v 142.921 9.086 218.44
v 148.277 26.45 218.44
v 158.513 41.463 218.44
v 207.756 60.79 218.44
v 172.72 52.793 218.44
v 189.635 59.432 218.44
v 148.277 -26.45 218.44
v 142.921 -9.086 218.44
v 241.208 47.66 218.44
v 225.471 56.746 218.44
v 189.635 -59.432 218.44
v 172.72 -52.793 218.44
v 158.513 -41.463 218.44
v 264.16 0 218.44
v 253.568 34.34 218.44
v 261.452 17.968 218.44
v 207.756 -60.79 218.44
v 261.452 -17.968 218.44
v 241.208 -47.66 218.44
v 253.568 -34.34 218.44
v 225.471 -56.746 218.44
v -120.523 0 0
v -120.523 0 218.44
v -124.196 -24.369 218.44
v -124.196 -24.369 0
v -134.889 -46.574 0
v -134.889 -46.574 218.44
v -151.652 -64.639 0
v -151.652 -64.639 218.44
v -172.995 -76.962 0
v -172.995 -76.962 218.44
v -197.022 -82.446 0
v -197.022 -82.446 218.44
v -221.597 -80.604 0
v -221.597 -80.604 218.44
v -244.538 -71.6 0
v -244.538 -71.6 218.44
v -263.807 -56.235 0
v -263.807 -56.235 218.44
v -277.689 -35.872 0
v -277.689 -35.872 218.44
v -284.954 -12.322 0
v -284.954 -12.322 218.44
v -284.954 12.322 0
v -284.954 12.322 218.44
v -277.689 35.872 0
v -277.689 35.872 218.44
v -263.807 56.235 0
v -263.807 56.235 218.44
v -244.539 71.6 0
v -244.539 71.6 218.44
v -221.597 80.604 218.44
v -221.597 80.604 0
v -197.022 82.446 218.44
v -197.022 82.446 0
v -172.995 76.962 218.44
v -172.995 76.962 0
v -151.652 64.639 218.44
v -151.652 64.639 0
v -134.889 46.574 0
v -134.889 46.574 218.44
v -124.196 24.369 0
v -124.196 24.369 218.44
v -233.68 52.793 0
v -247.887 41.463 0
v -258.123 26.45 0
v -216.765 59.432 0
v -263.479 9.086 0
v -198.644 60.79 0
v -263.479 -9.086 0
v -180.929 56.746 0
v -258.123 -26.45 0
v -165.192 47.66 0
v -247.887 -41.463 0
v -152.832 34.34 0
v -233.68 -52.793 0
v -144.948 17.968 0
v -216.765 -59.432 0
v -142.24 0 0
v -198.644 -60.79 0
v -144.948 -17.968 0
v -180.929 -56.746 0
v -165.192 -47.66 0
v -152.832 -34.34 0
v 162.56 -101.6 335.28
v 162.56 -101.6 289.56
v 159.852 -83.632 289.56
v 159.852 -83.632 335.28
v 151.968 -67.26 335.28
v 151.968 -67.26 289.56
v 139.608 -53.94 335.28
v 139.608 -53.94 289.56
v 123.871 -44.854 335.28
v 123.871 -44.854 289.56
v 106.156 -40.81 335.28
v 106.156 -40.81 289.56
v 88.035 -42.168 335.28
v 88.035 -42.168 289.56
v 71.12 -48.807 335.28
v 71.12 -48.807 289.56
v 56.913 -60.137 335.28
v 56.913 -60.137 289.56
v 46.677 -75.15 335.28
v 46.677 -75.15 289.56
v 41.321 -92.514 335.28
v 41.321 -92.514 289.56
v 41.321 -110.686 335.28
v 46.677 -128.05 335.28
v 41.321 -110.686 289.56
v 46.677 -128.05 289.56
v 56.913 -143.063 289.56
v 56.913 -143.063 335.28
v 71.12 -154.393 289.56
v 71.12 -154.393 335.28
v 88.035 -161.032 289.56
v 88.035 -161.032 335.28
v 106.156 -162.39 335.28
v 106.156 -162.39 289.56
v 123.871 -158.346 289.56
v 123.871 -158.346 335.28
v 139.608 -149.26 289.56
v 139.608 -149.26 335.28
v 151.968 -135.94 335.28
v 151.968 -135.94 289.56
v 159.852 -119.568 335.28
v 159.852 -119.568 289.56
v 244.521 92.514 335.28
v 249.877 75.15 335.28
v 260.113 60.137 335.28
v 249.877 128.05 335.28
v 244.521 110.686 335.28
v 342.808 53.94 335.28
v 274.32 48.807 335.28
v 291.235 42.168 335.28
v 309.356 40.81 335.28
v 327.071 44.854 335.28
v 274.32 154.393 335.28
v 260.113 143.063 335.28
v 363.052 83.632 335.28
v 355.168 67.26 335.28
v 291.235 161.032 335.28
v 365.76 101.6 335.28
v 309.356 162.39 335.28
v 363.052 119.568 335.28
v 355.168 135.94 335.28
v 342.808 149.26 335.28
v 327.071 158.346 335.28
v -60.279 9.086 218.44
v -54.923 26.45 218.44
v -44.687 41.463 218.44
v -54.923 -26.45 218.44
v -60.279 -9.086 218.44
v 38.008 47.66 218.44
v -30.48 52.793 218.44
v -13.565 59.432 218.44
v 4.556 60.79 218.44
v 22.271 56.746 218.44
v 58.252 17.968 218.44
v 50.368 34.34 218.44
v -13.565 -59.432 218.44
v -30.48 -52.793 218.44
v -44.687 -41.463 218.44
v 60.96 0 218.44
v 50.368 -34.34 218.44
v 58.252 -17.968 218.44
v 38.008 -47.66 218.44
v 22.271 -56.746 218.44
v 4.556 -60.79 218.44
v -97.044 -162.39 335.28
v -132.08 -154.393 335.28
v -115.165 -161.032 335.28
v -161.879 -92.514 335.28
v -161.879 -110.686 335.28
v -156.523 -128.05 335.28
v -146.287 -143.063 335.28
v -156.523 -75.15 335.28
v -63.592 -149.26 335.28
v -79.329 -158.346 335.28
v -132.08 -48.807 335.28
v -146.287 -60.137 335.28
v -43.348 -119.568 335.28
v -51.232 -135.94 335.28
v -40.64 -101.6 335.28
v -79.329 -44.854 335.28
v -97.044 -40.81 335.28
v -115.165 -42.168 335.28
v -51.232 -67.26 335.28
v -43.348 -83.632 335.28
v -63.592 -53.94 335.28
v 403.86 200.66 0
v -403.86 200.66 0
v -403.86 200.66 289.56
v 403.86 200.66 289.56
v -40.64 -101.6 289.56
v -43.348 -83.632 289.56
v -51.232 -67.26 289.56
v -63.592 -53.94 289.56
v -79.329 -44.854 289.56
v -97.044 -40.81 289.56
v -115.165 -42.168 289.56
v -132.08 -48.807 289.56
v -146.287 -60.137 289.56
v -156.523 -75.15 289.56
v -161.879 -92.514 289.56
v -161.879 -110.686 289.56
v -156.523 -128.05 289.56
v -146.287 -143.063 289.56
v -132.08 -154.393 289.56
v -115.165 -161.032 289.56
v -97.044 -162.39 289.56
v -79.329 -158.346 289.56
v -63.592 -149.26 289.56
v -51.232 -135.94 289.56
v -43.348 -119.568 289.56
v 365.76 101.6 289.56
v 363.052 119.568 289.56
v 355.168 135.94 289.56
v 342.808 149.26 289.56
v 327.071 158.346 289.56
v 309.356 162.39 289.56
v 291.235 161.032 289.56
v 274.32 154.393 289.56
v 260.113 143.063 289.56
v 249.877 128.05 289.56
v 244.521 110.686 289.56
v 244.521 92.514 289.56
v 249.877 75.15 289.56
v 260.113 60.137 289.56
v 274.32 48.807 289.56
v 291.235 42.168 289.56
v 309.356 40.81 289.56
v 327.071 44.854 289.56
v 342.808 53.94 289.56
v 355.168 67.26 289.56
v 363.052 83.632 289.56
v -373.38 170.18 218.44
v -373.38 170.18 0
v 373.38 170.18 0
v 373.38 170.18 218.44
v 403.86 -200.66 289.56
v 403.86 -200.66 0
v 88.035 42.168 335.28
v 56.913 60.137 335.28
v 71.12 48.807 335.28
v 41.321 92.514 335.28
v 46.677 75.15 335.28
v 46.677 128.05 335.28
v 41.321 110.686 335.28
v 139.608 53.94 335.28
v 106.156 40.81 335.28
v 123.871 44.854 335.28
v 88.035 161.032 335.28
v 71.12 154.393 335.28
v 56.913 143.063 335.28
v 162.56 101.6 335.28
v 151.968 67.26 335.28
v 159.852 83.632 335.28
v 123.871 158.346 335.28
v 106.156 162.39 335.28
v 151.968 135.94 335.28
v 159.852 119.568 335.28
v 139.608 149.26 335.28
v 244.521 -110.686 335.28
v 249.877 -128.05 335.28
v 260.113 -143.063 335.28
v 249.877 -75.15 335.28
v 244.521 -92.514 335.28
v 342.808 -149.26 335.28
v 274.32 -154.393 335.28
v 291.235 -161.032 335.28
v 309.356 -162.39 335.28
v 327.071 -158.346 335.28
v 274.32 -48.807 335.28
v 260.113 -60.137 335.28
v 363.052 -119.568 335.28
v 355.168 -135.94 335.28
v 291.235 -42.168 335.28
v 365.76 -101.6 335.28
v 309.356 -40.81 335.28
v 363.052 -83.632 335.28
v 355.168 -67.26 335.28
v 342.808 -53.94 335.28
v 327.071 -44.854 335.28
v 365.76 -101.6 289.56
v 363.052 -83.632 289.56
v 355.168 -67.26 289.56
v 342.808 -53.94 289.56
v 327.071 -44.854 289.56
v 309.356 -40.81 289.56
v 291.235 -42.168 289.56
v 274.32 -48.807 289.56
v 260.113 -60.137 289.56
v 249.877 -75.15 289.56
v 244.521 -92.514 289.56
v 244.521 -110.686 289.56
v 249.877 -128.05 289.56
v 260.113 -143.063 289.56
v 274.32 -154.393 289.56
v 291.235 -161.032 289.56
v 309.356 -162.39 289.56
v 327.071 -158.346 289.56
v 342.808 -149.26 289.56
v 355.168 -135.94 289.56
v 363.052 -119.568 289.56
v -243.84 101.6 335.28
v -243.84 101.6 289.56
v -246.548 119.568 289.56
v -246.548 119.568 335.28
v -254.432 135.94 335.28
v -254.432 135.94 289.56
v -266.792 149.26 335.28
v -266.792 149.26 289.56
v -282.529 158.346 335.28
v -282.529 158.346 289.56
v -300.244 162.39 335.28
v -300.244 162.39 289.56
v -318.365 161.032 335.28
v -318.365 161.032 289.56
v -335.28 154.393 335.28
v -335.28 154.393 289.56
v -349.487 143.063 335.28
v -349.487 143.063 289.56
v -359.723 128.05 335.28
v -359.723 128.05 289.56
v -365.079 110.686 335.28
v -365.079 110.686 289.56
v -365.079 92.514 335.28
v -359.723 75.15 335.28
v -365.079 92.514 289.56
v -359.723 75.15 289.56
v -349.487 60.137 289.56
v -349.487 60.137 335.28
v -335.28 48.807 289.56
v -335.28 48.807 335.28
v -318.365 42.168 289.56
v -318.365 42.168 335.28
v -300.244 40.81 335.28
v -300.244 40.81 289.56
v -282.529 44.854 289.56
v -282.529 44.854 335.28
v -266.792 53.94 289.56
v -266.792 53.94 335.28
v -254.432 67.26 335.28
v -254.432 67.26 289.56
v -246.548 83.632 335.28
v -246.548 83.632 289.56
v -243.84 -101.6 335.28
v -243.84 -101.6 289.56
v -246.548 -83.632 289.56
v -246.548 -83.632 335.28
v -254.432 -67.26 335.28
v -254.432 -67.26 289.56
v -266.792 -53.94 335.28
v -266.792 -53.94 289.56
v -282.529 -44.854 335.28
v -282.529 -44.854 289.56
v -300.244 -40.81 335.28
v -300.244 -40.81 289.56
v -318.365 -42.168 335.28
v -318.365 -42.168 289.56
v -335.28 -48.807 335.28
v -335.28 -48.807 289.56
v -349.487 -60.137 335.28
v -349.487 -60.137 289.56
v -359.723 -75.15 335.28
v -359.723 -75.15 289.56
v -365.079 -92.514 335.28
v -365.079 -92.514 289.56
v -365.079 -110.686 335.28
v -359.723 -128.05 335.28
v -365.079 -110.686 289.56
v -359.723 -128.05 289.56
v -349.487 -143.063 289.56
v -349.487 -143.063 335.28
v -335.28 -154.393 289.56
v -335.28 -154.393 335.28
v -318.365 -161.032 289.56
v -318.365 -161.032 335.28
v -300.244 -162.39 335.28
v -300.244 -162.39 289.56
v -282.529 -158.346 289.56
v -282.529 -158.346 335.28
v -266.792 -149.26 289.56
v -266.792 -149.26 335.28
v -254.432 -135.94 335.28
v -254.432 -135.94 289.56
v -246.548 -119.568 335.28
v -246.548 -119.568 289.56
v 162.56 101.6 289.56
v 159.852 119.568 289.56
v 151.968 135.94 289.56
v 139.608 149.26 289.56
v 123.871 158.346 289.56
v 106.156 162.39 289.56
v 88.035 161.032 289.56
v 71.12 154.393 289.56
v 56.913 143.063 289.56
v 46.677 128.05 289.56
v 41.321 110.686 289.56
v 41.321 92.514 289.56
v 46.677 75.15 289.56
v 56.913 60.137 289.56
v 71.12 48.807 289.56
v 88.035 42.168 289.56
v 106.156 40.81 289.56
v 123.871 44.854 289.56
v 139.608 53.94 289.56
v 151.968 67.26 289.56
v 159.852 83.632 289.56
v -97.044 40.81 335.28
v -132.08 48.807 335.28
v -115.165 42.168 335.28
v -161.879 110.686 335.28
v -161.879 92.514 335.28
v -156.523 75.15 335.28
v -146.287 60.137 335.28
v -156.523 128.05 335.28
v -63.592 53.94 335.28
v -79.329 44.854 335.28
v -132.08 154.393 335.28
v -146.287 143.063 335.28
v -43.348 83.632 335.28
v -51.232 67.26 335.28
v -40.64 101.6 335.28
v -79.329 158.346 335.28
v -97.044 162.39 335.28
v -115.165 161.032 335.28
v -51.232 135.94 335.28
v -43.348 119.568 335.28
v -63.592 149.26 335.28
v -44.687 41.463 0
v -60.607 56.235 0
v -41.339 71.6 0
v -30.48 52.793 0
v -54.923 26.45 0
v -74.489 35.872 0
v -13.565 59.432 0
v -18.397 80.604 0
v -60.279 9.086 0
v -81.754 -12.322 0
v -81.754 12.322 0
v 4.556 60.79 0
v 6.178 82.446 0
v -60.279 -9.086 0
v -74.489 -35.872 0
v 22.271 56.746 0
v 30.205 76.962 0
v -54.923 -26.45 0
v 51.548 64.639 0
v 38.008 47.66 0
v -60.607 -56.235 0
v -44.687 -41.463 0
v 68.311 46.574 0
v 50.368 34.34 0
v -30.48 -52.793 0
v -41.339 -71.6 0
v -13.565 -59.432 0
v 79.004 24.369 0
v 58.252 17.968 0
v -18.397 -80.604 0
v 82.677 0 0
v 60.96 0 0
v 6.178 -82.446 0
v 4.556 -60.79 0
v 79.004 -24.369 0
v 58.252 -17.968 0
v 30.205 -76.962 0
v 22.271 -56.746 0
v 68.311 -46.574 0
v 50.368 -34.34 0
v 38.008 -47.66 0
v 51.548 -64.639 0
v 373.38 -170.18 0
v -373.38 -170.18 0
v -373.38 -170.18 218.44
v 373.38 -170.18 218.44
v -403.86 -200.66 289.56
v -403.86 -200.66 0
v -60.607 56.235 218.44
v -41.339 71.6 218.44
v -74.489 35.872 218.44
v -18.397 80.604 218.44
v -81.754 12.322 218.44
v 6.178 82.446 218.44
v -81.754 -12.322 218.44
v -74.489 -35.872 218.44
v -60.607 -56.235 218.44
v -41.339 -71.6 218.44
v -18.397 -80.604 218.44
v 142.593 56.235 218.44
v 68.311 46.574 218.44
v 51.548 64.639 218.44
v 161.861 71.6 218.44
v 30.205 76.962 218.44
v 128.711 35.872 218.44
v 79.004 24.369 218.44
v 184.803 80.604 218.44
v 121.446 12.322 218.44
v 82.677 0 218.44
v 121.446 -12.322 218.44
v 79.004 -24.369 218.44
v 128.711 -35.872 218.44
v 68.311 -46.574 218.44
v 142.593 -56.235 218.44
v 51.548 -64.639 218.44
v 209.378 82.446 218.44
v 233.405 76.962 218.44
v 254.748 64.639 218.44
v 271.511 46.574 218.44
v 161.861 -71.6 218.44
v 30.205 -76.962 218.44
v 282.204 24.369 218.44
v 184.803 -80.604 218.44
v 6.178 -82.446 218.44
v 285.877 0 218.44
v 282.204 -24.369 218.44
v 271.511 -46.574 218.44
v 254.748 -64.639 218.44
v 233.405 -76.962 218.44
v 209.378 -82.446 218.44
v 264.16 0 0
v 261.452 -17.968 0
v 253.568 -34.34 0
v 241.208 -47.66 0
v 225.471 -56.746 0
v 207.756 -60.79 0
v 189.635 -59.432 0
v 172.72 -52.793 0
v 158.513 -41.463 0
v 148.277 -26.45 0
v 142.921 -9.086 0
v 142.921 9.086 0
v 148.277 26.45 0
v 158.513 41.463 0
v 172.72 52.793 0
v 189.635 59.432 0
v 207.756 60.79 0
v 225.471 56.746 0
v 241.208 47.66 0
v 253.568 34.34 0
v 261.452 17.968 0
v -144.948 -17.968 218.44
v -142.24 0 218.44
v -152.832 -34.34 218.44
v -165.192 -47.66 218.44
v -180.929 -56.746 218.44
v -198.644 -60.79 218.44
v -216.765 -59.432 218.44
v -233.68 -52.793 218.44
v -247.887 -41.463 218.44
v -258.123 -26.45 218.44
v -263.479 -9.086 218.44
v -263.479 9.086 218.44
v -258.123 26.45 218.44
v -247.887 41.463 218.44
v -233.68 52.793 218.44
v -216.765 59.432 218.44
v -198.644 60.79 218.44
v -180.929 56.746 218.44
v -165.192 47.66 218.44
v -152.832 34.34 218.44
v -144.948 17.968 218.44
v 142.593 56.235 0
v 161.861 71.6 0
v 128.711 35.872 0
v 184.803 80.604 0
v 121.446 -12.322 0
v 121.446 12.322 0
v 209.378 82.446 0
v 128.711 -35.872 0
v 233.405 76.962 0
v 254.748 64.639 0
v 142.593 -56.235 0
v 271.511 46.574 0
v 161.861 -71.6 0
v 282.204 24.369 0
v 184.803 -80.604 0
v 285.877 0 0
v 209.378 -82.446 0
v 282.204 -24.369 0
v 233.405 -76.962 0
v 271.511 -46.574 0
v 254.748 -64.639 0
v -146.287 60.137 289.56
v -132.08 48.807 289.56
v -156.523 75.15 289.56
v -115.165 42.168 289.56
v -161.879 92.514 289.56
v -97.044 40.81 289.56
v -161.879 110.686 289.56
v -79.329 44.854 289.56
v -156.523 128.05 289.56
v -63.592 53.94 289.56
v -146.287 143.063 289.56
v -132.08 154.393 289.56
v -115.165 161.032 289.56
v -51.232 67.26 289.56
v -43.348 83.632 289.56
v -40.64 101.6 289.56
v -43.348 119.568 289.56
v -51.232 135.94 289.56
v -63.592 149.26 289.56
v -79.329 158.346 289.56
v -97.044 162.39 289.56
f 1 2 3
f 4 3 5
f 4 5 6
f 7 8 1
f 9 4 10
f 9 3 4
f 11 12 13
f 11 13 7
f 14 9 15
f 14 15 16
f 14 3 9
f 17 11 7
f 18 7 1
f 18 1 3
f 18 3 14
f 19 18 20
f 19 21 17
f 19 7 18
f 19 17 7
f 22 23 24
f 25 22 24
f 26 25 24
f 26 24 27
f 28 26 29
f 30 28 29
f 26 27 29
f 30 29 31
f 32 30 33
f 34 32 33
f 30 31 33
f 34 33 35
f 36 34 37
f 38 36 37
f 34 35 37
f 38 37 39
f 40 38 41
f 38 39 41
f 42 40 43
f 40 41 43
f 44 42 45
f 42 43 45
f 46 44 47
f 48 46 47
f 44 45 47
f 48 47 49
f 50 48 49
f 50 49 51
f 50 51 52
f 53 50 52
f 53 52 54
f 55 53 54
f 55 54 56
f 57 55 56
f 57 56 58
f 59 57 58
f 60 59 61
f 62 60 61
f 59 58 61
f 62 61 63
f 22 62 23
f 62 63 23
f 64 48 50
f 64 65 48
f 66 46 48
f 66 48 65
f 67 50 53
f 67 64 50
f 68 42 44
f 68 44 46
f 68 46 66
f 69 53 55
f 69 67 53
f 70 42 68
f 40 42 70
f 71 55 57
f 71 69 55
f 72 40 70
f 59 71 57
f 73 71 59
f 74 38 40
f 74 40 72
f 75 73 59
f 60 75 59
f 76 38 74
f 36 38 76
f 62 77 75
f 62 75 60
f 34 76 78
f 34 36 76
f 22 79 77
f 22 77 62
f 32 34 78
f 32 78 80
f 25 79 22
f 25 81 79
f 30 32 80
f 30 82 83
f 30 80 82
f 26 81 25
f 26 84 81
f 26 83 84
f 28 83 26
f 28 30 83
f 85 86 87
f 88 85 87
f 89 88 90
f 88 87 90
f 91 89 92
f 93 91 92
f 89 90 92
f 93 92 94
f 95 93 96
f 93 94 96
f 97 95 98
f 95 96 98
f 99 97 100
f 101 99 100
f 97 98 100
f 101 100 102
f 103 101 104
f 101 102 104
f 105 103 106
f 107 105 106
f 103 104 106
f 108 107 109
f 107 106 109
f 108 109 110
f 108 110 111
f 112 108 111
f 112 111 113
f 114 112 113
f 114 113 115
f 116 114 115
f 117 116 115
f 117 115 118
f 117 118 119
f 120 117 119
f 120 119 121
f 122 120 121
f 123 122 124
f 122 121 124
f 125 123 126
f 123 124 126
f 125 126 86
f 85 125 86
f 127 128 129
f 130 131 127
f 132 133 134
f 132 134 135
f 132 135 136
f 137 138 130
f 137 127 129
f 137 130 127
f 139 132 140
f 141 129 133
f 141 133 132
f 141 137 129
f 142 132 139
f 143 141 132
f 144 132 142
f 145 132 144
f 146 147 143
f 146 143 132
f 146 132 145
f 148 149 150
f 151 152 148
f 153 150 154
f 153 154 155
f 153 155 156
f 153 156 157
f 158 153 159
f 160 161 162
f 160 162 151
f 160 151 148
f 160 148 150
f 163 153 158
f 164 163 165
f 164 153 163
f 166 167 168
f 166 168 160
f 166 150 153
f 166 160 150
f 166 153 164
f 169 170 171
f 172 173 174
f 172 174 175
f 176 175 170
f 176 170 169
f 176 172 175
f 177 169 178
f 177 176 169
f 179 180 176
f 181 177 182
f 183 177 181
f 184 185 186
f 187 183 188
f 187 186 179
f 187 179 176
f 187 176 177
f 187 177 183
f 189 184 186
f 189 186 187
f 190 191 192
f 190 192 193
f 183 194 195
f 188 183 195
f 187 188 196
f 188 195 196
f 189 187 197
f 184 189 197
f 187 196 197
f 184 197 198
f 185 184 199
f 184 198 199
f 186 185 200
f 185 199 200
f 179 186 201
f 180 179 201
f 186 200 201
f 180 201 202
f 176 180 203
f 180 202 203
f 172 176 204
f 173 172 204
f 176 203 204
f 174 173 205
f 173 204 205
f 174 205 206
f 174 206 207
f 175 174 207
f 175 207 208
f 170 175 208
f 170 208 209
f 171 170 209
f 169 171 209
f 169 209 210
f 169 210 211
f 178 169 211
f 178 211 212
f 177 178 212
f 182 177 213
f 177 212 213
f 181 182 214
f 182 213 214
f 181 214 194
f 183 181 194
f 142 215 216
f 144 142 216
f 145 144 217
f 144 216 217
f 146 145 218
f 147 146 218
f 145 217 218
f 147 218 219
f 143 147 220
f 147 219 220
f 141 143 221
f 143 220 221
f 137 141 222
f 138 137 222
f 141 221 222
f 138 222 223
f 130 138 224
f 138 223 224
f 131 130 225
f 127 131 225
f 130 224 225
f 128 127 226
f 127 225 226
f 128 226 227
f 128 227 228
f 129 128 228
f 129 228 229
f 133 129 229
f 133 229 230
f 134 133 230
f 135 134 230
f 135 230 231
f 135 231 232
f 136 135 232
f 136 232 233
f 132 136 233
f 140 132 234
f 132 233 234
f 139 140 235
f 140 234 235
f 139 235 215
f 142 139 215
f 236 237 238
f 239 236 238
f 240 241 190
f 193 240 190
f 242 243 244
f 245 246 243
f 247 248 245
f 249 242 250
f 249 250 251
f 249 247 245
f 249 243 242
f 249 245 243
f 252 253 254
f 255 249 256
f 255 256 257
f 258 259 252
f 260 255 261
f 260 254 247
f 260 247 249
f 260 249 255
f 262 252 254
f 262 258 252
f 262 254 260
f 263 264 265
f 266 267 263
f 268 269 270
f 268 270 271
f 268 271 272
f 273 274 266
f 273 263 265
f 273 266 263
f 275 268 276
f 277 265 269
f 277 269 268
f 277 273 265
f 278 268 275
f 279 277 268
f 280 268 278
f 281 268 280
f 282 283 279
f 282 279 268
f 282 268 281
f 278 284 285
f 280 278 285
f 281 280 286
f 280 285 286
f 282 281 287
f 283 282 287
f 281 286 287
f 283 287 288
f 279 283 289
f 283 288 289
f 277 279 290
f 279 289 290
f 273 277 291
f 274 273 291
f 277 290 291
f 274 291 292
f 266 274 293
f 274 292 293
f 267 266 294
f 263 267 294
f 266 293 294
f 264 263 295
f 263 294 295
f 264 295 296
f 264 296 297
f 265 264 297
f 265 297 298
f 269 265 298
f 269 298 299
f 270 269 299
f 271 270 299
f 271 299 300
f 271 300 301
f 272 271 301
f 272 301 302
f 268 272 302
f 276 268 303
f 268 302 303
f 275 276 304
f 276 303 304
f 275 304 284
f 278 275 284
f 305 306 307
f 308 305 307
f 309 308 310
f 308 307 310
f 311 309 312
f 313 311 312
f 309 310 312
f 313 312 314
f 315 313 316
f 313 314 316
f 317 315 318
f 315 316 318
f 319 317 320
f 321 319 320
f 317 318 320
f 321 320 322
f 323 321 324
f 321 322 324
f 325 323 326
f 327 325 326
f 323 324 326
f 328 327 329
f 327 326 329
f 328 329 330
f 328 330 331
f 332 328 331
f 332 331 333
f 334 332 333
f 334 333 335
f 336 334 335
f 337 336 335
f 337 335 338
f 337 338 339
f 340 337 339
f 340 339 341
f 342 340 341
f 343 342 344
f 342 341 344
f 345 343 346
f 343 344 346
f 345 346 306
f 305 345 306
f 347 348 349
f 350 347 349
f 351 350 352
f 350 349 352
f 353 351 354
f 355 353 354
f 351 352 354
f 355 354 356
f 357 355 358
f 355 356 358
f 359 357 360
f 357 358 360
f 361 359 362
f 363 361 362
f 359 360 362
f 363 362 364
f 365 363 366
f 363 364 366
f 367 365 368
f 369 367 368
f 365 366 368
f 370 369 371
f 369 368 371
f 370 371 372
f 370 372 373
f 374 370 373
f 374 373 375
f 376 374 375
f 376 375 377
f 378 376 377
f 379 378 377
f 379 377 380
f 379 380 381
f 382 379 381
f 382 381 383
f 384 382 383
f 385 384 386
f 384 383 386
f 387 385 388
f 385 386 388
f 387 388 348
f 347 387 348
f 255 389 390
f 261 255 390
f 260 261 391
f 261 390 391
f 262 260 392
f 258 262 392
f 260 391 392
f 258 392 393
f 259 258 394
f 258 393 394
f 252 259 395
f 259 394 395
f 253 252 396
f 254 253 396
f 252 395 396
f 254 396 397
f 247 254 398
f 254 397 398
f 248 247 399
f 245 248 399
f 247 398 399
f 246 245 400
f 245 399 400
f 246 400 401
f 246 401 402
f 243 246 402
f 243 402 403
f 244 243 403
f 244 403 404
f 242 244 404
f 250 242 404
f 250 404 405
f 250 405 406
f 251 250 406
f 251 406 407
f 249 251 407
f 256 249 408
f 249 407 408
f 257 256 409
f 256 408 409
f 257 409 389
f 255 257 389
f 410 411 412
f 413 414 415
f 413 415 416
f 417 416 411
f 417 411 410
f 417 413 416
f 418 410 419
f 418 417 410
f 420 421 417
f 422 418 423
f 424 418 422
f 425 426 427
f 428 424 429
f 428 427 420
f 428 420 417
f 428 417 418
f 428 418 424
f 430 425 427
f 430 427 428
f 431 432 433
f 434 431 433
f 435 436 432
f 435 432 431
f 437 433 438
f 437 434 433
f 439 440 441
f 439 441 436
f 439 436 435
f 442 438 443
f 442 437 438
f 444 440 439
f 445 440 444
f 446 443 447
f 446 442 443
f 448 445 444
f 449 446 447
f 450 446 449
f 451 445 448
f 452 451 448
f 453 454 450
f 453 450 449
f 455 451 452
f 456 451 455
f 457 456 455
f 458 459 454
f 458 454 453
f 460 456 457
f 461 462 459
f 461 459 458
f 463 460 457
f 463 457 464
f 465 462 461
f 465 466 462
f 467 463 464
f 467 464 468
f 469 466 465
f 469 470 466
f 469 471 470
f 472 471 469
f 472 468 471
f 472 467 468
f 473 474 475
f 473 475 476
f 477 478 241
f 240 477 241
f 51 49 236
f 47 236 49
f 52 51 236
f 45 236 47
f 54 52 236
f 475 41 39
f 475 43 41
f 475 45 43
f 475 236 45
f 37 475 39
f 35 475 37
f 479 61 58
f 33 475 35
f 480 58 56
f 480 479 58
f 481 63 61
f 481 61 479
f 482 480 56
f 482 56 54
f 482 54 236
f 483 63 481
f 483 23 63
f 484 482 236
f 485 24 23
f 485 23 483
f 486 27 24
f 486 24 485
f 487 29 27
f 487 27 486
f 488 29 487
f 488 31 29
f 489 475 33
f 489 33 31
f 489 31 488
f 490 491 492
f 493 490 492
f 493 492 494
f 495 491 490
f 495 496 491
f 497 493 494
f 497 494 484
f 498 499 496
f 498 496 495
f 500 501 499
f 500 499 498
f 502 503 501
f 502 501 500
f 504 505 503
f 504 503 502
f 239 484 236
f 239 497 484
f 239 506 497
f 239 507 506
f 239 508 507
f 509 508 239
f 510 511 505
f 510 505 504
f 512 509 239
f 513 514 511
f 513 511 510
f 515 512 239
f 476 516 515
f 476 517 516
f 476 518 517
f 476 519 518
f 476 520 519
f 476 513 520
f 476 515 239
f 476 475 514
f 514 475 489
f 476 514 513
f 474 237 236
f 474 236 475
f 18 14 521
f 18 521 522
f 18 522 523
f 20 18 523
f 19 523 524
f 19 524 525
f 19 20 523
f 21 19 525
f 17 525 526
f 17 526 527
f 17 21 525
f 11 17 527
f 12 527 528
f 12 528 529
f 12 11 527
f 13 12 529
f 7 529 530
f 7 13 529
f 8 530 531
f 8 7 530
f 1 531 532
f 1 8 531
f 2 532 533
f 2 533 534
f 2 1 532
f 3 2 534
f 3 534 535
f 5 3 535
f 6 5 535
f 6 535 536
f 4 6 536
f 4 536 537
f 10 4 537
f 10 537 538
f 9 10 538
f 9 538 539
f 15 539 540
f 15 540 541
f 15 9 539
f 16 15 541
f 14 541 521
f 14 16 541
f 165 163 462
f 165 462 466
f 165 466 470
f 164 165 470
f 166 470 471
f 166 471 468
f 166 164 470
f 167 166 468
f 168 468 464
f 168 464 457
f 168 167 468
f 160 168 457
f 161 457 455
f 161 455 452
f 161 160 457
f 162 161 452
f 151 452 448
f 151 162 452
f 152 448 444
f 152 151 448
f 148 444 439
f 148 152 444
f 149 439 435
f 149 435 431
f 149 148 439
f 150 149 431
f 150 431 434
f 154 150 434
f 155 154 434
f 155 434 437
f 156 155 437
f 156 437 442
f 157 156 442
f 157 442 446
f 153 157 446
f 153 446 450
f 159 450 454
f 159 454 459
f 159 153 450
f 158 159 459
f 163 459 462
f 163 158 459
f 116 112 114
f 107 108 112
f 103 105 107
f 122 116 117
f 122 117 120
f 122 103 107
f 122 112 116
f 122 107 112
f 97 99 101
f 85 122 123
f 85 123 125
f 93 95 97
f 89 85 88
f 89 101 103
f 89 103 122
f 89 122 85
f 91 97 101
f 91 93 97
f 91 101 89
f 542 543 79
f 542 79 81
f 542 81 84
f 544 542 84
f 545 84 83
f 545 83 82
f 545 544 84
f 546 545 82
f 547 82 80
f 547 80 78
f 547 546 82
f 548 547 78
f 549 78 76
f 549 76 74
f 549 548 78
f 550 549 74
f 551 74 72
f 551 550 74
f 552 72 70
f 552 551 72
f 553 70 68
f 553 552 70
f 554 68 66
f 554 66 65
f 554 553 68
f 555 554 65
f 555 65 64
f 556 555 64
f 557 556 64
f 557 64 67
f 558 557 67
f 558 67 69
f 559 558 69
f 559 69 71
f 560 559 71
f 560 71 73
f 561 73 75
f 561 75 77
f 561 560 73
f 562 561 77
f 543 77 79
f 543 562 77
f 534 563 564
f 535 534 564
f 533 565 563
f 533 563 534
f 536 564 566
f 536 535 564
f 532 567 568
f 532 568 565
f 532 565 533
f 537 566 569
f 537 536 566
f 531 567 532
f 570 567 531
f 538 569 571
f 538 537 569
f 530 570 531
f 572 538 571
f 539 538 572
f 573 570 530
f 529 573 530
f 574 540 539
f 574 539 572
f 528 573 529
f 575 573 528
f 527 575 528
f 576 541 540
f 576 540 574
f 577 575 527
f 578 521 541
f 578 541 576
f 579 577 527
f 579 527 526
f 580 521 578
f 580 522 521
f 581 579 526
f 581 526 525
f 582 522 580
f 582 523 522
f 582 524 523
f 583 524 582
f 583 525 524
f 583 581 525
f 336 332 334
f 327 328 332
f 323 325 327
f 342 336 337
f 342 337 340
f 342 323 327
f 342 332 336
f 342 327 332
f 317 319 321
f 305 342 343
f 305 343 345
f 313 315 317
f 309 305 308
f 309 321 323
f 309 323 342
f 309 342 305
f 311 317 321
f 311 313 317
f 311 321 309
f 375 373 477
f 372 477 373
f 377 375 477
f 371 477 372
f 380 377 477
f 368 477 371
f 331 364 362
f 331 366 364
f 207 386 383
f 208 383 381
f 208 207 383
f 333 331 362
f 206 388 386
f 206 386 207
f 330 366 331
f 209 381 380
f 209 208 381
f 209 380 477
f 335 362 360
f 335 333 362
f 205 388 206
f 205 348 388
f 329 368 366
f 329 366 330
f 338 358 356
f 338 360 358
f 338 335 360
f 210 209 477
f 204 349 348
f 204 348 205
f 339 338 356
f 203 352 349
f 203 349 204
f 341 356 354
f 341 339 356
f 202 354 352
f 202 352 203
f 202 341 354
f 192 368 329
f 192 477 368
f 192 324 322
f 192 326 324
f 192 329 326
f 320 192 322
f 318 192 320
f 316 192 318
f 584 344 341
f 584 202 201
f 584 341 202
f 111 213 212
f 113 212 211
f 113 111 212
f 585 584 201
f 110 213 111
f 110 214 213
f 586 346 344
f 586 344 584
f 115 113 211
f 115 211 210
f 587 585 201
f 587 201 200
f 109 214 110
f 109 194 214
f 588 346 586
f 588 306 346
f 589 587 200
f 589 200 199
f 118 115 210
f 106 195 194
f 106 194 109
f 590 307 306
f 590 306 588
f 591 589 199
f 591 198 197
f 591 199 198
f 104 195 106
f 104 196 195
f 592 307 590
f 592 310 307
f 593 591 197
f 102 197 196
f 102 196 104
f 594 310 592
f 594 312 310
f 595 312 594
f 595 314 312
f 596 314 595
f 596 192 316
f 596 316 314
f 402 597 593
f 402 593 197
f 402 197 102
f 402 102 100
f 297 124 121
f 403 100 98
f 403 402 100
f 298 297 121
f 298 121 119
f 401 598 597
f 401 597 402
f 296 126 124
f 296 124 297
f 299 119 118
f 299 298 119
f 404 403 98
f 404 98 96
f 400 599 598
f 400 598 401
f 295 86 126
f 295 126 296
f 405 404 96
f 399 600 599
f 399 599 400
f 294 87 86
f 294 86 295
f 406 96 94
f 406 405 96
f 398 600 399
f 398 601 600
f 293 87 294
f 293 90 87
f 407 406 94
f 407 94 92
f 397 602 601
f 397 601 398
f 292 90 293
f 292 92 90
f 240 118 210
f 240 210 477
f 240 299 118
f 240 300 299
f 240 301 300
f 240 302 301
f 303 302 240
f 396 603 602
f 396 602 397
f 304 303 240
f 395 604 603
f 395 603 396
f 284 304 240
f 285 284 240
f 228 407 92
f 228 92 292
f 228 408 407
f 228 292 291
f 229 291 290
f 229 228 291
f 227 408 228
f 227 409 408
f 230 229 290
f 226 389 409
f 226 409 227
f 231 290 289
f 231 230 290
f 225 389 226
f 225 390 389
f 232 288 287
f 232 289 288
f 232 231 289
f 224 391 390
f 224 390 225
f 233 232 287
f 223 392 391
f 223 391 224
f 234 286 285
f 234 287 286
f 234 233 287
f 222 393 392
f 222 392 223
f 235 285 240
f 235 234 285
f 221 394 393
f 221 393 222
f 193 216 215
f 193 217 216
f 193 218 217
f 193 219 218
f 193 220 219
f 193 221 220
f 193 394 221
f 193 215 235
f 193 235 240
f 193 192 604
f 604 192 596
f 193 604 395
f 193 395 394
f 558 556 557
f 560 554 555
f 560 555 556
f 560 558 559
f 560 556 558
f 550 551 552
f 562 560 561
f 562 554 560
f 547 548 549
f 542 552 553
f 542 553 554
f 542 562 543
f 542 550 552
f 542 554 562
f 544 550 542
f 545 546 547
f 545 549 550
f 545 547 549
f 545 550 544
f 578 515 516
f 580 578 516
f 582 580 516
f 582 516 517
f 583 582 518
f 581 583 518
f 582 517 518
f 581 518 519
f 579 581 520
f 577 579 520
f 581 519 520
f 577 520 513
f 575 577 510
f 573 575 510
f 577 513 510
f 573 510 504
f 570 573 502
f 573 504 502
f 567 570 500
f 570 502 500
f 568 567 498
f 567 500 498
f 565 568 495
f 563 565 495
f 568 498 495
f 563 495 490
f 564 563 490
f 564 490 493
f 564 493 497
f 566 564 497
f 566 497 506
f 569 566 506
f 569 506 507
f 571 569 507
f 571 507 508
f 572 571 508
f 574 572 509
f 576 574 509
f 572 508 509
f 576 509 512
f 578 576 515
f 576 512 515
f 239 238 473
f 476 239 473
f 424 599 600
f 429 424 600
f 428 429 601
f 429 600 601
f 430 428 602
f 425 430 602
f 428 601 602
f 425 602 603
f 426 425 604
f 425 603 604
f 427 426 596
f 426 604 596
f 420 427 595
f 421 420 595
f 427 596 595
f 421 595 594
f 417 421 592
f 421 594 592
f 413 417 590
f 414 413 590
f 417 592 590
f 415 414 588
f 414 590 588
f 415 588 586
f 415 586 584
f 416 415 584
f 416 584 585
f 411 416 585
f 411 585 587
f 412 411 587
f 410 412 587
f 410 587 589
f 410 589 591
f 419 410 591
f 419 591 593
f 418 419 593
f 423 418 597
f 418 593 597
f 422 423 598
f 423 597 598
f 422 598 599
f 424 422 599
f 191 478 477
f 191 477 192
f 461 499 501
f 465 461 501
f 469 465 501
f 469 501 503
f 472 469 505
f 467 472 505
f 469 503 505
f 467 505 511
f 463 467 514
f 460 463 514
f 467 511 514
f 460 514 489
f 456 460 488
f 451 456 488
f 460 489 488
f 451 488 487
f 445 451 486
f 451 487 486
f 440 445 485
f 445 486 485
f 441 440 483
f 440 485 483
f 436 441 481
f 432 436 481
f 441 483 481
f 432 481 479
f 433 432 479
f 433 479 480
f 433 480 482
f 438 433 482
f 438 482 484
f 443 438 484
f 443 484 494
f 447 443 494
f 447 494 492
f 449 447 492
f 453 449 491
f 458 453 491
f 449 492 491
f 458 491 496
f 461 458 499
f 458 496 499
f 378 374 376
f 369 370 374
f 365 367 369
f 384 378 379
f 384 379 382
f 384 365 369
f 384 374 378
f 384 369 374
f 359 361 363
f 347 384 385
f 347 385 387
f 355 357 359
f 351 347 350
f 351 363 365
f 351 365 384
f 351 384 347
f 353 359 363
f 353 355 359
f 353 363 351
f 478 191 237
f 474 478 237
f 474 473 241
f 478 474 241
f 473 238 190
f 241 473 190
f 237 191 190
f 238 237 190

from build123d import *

# Parameters (mm, degrees)
F0_W     = 807.72
F0_H     = 401.32
F1_DEPTH = 289.56
F2_R     = 60.96
F3_DEPTH = 45.72
F4_W     = 746.76
F4_H     = 340.36
F5_DEPTH = 218.44
F6_R     = 82.677
F6_R_2   = 60.96
F7_DEPTH = 218.44


with BuildPart() as f1:
    # F0 (on Top) → F1 (new body)
    with BuildSketch(Plane.XY):
        Rectangle(F0_W, F0_H)
    extrude(amount=F1_DEPTH)

    # F2 (on face) → F3 (join)
    with BuildSketch(Plane.XY.offset(289.56)):
        with Locations((-304.8, -101.6)):
            Circle(F2_R)
        with Locations((-304.8, 101.6)):
            Circle(F2_R)
        with Locations((-101.6, 101.6)):
            Circle(F2_R)
        with Locations((-101.6, -101.6)):
            Circle(F2_R)
        with Locations((101.6, -101.6)):
            Circle(F2_R)
        with Locations((101.6, 101.6)):
            Circle(F2_R)
        with Locations((304.8, 101.6)):
            Circle(F2_R)
        with Locations((304.8, -101.6)):
            Circle(F2_R)
    extrude(amount=F3_DEPTH)

    # F4 (on face) → F5 (cut)
    with BuildSketch(Plane(origin=(0, 0, 0), x_dir=(1, 0, 0), z_dir=(0, 0, -1))):
        Rectangle(F4_W, F4_H)
    extrude(amount=-F5_DEPTH, mode=Mode.SUBTRACT)

    # F6 (on face) → F7 (join)
    with BuildSketch(Plane(origin=(0, 0, 218.44), x_dir=(1, 0, 0), z_dir=(0, 0, -1))):
        with Locations((-203.2, 0)):
            Circle(F6_R)
        with Locations((-203.2, 0)):
            Circle(F6_R_2, mode=Mode.SUBTRACT)
        Circle(F6_R)
        Circle(F6_R_2, mode=Mode.SUBTRACT)
        with Locations((203.2, 0)):
            Circle(F6_R)
        with Locations((203.2, 0)):
            Circle(F6_R_2, mode=Mode.SUBTRACT)
    extrude(amount=F7_DEPTH)


solid = f1.part
